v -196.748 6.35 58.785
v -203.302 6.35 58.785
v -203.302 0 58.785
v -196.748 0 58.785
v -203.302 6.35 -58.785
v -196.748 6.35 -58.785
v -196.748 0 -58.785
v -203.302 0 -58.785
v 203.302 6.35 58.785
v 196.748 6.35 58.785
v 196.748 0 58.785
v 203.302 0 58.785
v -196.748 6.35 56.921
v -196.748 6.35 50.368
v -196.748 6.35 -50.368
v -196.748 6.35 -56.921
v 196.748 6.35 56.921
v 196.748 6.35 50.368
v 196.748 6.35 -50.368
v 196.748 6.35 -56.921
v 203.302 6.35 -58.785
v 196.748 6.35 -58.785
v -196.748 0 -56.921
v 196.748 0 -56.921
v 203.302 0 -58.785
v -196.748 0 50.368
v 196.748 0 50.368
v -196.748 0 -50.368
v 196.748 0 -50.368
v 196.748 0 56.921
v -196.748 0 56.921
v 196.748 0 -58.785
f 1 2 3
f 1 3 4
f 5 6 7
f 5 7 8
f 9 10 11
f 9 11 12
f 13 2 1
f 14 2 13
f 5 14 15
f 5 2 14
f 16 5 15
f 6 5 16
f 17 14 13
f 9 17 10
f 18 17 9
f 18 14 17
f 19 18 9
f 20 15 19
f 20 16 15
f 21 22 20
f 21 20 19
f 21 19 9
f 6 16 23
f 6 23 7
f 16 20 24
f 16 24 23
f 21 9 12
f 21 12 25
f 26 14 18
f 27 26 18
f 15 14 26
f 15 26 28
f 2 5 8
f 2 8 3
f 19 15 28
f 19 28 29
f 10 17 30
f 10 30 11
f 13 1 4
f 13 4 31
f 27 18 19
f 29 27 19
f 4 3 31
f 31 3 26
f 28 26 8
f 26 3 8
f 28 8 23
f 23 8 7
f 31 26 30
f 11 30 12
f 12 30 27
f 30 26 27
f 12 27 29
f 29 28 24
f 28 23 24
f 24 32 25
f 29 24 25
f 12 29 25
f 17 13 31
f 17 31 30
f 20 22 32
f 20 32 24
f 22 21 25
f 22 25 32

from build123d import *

# Parameters (mm, degrees)
SKETCH1_W           = 393.7
SKETCH1_H           = 100.9392952
BOSS_EXTRUDE1_DEPTH = 6.35
SKETCH2_W           = 393.4968
SKETCH2_H           = 100.7360952
BOSS_EXTRUDE2_DEPTH = 6.35


with BuildPart() as part:
    # Sketch1 → Boss-Extrude1 (new body)
    with BuildSketch(Plane(origin=(0, 0, 0), x_dir=(1, 0, 0), z_dir=(0, 1, 0))):
        Polygon((196.85, 58.683525), (203.2, 58.683525), (203.2, -58.683525), (196.85, -58.683525), (196.85, -56.8196476), (-196.85, -56.8196476), (-196.85, -58.683525), (-203.2, -58.683525), (-203.2, 58.683525), (-196.85, 58.683525), (-196.85, 56.8196476), (196.85, 56.8196476), align=None)
        Rectangle(SKETCH1_W, SKETCH1_H, mode=Mode.SUBTRACT)
    extrude(amount=BOSS_EXTRUDE1_DEPTH)

    # Sketch2 → Boss-Extrude2 (add)
    with BuildSketch(Plane(origin=(0, 6.35, 0), x_dir=(1, 0, 0), z_dir=(0, 1, 0))):
        Polygon((196.7484, -58.785125), (203.3016, -58.785125), (203.3016, 58.785125), (196.7484, 58.785125), (196.7484, 56.9212476), (-196.7484, 56.9212476), (-196.7484, 58.785125), (-203.3016, 58.785125), (-203.3016, -58.785125), (-196.7484, -58.785125), (-196.7484, -56.9212476), (196.7484, -56.9212476), align=None)
        Rectangle(SKETCH2_W, SKETCH2_H, mode=Mode.SUBTRACT)
    extrude(amount=-BOSS_EXTRUDE2_DEPTH)


solid = part.part
